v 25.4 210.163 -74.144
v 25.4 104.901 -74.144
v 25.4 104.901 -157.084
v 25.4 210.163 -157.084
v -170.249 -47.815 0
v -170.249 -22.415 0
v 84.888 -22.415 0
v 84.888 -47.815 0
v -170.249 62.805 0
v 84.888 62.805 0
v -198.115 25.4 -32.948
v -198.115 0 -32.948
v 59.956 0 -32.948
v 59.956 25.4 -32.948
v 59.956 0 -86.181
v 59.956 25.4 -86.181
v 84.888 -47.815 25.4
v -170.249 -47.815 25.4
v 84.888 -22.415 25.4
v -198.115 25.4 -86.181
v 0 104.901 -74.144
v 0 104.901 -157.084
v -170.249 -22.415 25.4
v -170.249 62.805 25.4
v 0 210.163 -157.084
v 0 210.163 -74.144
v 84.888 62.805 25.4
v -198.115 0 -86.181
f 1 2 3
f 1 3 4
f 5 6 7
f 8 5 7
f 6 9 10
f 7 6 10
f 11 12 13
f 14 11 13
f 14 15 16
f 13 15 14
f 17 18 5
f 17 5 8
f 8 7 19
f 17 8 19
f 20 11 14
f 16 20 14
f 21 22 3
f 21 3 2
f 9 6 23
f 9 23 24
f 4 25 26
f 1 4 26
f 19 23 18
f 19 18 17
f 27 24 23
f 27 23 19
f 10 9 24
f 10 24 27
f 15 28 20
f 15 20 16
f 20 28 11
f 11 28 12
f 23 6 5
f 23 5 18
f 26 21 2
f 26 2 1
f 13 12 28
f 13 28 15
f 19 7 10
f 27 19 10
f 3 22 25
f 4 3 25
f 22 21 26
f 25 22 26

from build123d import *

# Parameters (mm, degrees)
F0_W      = 255.137317
F0_H      = 85.220656
F1_DEPTH  = 25.4
F1_FACE_W = 255.137316
F1_FACE_H = 25.4
F2_DEPTH  = 25.4
F3_W      = 258.07064
F3_H      = 53.233352
F4_DEPTH  = 25.4
F5_W      = 105.262048
F5_H      = 82.939684
F6_DEPTH  = 25.4


with BuildPart() as f1:
    # F0 (on Top) → F1 (new body)
    with BuildSketch(Plane.XY):
        with Locations((-42.680238, 20.195064)):
            Rectangle(F0_W, F0_H)
    extrude(amount=F1_DEPTH)

    # F1_face (on face) → F2 (join)
    with BuildSketch(Plane(origin=(-42.680237, -22.415264, 12.7), x_dir=(1, 0, 0), z_dir=(0, -1, 0))):
        Rectangle(F1_FACE_W, F1_FACE_H)
    extrude(amount=F2_DEPTH)


with BuildPart() as f4:
    # F3 (on Front) → F4 (new body)
    with BuildSketch(Plane.XZ):
        with Locations((-69.079507, -59.564503)):
            Rectangle(F3_W, F3_H)
    extrude(amount=-F4_DEPTH)


with BuildPart() as f6:
    # F5 (on Right) → F6 (new body)
    with BuildSketch(Plane.YZ):
        with Locations((157.531973, -115.613803)):
            Rectangle(F5_W, F5_H)
    extrude(amount=F6_DEPTH)


solid = Compound([f1.part, f4.part, f6.part])
